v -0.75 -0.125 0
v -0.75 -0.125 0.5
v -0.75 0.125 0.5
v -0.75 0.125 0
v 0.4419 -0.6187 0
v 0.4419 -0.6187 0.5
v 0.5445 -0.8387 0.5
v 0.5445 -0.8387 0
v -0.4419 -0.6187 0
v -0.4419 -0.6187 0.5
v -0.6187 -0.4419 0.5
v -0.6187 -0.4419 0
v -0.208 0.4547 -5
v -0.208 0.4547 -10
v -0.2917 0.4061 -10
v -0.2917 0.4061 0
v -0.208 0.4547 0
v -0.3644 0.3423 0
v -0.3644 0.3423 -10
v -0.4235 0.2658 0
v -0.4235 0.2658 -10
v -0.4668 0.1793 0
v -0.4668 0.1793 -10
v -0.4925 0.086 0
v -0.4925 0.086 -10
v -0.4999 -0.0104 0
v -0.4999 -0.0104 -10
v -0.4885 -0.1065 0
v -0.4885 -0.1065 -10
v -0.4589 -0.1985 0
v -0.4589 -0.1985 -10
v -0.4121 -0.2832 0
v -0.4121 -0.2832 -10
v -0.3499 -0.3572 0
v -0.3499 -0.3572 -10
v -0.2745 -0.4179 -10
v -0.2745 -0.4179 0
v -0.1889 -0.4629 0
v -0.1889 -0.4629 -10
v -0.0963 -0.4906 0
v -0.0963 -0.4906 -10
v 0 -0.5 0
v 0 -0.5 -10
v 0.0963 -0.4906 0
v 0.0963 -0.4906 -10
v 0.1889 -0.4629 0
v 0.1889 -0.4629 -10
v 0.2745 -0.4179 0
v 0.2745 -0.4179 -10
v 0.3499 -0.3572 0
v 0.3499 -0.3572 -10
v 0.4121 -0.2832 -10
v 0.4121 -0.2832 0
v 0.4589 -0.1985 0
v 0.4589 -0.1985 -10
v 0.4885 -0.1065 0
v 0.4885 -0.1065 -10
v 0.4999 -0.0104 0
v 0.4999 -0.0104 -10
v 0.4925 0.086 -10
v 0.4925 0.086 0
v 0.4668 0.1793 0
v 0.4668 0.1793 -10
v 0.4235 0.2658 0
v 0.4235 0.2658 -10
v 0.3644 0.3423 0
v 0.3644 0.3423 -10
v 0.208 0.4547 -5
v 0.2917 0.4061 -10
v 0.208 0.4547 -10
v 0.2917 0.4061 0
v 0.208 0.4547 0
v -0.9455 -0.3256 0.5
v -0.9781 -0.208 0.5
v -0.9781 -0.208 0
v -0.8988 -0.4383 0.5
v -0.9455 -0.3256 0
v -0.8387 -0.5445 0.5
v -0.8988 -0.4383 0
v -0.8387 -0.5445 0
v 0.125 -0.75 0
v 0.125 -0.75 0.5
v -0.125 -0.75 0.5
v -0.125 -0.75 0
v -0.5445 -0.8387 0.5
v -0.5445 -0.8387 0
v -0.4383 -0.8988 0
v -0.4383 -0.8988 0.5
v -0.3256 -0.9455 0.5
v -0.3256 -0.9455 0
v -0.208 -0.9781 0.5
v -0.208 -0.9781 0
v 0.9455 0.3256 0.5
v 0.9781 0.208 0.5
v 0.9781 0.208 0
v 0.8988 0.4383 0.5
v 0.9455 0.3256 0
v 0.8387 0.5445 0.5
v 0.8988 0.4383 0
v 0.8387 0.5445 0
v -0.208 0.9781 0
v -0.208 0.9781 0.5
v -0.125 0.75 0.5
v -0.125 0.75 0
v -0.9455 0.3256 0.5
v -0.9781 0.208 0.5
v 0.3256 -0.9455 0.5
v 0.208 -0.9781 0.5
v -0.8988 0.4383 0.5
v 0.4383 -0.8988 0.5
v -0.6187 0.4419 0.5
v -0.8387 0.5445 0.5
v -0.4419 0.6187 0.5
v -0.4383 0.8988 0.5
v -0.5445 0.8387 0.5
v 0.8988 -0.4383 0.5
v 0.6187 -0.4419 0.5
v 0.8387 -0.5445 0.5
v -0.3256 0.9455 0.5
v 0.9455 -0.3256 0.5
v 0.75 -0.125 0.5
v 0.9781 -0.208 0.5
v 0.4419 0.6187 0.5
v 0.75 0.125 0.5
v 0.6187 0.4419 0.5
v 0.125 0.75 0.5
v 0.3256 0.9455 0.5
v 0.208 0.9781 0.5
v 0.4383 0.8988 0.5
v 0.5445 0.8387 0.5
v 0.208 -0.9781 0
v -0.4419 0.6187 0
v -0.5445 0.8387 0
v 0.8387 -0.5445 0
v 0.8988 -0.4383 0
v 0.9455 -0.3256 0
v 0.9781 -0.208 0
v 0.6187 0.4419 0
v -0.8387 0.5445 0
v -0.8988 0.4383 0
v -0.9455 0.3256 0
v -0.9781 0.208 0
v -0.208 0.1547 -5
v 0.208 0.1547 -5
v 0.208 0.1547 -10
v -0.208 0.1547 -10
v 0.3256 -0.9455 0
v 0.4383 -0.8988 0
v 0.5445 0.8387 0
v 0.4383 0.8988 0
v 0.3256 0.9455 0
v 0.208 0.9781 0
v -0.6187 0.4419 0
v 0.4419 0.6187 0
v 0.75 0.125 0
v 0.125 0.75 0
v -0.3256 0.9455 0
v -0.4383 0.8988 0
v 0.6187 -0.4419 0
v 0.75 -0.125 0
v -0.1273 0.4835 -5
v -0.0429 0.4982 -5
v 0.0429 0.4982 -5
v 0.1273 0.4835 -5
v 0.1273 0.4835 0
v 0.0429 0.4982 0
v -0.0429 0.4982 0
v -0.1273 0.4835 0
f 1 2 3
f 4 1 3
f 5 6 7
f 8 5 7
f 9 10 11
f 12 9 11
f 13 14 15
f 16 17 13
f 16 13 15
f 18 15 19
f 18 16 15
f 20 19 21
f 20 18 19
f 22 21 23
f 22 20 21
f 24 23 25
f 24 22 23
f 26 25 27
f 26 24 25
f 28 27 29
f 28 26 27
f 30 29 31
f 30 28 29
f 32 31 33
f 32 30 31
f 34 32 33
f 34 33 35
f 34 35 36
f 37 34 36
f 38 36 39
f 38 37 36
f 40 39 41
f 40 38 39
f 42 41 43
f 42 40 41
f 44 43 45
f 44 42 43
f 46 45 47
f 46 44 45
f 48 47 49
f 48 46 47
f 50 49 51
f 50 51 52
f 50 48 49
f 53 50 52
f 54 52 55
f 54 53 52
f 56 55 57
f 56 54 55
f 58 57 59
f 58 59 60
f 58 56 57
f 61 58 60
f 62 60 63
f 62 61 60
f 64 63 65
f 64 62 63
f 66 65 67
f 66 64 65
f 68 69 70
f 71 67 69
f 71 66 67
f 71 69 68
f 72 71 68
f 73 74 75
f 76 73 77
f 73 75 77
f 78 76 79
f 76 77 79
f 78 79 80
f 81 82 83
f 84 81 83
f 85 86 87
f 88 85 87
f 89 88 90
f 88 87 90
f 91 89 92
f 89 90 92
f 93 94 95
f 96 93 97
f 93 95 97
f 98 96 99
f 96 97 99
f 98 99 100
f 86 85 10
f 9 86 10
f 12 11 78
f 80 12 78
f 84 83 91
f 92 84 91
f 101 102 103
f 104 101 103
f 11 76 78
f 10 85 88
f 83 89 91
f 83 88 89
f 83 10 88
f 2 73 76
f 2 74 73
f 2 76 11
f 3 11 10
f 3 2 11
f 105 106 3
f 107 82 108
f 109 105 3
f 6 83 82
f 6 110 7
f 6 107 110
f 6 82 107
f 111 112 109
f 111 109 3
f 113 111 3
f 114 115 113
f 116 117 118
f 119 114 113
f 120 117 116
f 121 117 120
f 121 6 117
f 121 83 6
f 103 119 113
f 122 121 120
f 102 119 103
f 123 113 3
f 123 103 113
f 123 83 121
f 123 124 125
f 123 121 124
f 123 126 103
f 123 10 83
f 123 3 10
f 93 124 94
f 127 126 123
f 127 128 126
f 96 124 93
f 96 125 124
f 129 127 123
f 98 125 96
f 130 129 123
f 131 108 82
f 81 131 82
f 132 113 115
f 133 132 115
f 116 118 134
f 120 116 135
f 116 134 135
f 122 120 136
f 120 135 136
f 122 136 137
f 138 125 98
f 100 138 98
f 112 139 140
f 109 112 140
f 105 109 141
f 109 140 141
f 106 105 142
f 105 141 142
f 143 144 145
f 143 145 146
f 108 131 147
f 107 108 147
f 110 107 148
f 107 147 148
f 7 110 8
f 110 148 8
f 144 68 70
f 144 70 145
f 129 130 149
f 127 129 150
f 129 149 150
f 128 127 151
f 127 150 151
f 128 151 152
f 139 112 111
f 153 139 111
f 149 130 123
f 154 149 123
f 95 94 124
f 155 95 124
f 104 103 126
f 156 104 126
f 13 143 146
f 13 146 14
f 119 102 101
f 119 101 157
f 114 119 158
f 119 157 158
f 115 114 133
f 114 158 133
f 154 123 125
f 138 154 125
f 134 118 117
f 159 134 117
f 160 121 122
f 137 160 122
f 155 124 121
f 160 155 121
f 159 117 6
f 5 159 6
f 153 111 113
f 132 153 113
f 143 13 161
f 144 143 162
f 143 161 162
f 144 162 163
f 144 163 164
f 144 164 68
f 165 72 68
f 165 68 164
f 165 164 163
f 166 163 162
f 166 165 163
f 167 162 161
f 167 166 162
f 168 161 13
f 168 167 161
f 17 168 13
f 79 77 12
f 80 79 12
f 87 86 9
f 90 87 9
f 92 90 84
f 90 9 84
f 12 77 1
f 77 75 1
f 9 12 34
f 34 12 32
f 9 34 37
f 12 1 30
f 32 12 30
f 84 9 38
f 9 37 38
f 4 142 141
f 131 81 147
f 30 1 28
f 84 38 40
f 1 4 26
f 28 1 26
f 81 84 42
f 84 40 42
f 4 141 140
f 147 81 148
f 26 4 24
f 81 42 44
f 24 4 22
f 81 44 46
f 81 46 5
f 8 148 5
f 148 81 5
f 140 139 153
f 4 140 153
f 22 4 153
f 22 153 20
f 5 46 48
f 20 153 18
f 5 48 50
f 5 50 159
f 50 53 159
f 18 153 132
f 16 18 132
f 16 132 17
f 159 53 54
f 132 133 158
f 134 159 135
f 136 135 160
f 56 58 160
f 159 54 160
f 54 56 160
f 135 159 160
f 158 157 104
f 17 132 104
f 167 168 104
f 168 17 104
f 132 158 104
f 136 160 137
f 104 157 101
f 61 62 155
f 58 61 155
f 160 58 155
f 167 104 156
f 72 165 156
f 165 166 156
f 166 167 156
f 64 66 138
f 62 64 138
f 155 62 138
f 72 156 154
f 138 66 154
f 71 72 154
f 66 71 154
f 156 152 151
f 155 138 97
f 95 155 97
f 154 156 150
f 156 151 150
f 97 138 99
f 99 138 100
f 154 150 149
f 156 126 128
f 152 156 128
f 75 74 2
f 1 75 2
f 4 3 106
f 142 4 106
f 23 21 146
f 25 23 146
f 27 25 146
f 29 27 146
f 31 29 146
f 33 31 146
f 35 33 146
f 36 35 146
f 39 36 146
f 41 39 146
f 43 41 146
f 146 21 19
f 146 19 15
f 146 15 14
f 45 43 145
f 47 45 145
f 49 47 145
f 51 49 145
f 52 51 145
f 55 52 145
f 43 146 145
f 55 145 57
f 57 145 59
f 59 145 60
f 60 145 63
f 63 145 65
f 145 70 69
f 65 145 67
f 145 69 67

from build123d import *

# Parameters (mm, degrees)
SKETCH1_R              = 1
BASE_DEPTH             = 0.5
CUT_EXTRUDE6_DEPTH     = 2.5
CIRPATTERN1_COUNT      = 8
WHOLE_CONNECTION_DEPTH = 10
SKETCH1_6_R            = 0.5
ON_BEARING_DEPTH       = 5


with BuildPart() as part:
    # Sketch1 → Base (new body)
    with BuildSketch(Plane.XY):
        Circle(SKETCH1_R)
    extrude(amount=BASE_DEPTH)

    # Sketch1<3> → Cut-Extrude6 (cut, symmetric)
    with BuildSketch(Plane.XY):
        with BuildLine():
            Line((0.125, 0.75), (0.208029796, 0.978122489))
            ThreePointArc((0.208029796, 0.978122489), (0, 1), (-0.208029796, 0.978122489))
            Line((-0.208029796, 0.978122489), (-0.125, 0.75))
            Line((-0.125, 0.75), (0, 0.75))
            Line((0, 0.75), (0.125, 0.75))
        make_face()
    cut_extrude6 = extrude(amount=CUT_EXTRUDE6_DEPTH, both=True, mode=Mode.SUBTRACT)

    # CirPattern1: Cut-Extrude6 ×8 about axis
    cirpattern1_axis = Axis((0, 0, 0.5), (0, 0, -1))
    for i in range(1, CIRPATTERN1_COUNT):
        add(cut_extrude6.rotate(cirpattern1_axis, i * 360 / CIRPATTERN1_COUNT), mode=Mode.SUBTRACT)

    # Sketch1<5> → Whole-connection (add)
    with BuildSketch(Plane.XY):
        with BuildLine():
            Line((0.208029796, 0.454668675), (0.208029796, 0.154668675))
            Line((0.208029796, 0.154668675), (-0.208029796, 0.154668675))
            Line((-0.208029796, 0.154668675), (-0.208029796, 0.454668675))
            ThreePointArc((-0.208029796, 0.454668675), (0, -0.5), (0.208029796, 0.454668675))
        make_face()
    extrude(amount=-WHOLE_CONNECTION_DEPTH)

    # Sketch1<6> → On-bearing (add)
    with BuildSketch(Plane.XY):
        Circle(SKETCH1_6_R)
    extrude(amount=-ON_BEARING_DEPTH)


solid = part.part
